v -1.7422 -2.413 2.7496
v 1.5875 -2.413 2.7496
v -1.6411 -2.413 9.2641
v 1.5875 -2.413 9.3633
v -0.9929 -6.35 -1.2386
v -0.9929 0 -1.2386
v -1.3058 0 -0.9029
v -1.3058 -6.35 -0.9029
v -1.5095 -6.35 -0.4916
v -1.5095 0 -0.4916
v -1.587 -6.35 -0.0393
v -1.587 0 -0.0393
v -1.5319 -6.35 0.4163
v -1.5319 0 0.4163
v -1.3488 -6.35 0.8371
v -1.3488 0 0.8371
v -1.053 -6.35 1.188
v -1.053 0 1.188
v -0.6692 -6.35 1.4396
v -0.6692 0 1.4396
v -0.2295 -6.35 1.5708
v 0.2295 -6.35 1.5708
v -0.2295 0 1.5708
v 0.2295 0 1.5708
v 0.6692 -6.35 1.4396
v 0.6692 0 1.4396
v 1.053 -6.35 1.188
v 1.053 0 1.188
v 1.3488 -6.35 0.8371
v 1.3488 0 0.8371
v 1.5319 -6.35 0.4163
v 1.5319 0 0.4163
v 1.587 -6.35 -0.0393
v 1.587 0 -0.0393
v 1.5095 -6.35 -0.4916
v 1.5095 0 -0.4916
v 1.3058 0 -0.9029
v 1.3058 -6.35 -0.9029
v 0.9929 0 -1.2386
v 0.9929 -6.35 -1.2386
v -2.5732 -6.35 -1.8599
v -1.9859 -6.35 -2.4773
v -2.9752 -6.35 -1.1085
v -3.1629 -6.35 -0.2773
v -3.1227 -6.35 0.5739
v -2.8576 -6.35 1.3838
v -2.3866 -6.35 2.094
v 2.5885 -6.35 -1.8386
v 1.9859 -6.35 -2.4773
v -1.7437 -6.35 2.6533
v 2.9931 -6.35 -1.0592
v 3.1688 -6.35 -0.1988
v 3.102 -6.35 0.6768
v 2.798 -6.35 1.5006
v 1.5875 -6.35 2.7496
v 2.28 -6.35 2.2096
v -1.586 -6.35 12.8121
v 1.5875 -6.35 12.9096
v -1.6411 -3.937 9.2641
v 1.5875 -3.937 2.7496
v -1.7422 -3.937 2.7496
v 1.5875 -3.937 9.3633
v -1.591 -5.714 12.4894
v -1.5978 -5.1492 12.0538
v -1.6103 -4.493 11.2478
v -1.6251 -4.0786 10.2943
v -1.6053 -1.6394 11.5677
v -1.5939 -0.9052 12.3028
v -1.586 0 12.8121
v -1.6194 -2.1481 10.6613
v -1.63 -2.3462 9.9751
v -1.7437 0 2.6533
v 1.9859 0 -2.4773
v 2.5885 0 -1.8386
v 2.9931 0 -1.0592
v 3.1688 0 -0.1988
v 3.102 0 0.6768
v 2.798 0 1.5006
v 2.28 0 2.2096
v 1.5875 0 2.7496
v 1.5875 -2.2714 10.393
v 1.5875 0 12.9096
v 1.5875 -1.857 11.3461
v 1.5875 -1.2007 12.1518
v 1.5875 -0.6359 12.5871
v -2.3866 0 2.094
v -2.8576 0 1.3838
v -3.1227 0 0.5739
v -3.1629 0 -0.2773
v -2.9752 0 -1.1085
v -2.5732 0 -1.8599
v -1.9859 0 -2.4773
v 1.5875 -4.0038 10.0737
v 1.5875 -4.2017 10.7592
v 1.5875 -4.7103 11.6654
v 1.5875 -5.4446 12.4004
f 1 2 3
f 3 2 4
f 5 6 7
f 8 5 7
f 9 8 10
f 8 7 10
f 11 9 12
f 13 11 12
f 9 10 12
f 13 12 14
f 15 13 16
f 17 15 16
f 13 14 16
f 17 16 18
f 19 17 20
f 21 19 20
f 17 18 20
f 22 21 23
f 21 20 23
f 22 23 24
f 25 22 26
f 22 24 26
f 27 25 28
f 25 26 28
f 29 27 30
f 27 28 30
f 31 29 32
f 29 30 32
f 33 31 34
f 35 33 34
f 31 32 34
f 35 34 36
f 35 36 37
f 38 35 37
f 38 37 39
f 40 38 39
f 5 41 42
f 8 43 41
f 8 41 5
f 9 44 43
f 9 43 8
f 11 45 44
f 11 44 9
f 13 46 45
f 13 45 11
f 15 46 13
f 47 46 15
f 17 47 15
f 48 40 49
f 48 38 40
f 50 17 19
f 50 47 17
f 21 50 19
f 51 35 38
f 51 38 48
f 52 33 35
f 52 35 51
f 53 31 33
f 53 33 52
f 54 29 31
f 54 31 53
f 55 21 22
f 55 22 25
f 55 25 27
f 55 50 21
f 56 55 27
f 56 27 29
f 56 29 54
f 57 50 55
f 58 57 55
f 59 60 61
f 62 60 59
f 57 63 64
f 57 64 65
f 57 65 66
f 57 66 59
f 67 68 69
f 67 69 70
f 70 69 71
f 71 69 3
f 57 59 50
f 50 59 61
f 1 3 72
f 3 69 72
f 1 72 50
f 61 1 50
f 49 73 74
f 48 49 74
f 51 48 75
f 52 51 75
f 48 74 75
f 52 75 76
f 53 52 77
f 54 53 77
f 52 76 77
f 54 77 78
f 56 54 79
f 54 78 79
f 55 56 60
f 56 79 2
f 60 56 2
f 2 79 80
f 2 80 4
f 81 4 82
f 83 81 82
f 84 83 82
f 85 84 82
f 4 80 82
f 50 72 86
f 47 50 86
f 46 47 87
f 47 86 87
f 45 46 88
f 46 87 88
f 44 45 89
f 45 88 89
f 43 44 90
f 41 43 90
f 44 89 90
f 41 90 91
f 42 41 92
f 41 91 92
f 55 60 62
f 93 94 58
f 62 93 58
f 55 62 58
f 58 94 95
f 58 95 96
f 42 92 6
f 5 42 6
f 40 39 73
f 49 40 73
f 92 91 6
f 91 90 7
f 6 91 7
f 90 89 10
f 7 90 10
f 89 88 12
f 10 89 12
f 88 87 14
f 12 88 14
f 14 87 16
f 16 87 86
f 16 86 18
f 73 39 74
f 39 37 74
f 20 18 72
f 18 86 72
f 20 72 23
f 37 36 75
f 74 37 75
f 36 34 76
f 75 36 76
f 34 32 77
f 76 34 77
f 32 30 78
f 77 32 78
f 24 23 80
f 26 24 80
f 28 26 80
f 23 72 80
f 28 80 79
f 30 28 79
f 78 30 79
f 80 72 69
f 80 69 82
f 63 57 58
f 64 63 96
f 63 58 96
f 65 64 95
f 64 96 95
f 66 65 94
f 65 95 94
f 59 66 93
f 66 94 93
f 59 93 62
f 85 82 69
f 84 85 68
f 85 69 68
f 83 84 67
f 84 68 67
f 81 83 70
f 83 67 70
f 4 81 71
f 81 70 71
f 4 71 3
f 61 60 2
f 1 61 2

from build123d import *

# Parameters (mm, degrees)
F1_DEPTH    = 6.35
F2_W        = 1.524
F2_H        = 10.16
F3_DEPTH    = 25.4
F4_T1_DEPTH = 20.8982128859
F5_T1_DEPTH = 20.8982128859


# Not quite as in the source:
# - a fillet or chamfer that OpenCascade refuses, or shapes differently, is made with other operations: its cross-section is extruded or revolved along the edge and cut away or added


with BuildPart() as f1:
    # F0 (on Front) → F1 (new body)
    with BuildSketch(Plane.XZ):
        with BuildLine():
            Line((0.9929372138, -1.2386411666), (1.9858744275, -2.4772823331))
            ThreePointArc((1.9858744275, -2.4772823331), (3.1658183857, 0.2412860305), (1.5875, 2.749630657))
            Line((1.5875, 2.749630657), (1.5875, 12.909630657))
            Line((1.5875, 12.909630657), (-1.58600151, 12.8120951952))
            Line((-1.58600151, 12.8120951952), (-1.7437092207, 2.653319271))
            ThreePointArc((-1.7437092207, 2.653319271), (-3.1714691788, 0.1496938466), (-1.9858744275, -2.4772823331))
            Line((-1.9858744275, -2.4772823331), (-0.9929372138, -1.2386411666))
            ThreePointArc((-0.9929372138, -1.2386411666), (0, 1.5875), (0.9929372138, -1.2386411666))
        make_face()
    extrude(amount=F1_DEPTH)

    # F2 (on face) → F3 (cut)
    with BuildSketch(Plane.YZ.offset(1.5875)):
        with Locations((-3.175, 7.829630657)):
            Rectangle(F2_W, F2_H)
    extrude(amount=-F3_DEPTH, mode=Mode.SUBTRACT)

    # F4: fillet of radius 3.81 on 1 edges, made by hand

    # F4_s2 → F4_t1 (cut)
    with BuildSketch(Plane(origin=(10.839820428, 0, 0.3331546837), x_dir=(0, 1, 0), z_dir=(-0.9995280346, 0, -0.0307198305))):
        with BuildLine():
            ThreePointArc((-6.35, -12.8547700275), (-4.597502421, -11.4541342134), (-3.937, -9.3101274503))
            Line((-3.937, -9.3101274503), (-3.937, -12.8547700275))
            Line((-3.937, -12.8547700275), (-6.35, -12.8547700275))
        make_face()
    extrude(amount=F4_T1_DEPTH, mode=Mode.SUBTRACT)

    # F5: fillet of radius 3.81 on 1 edges, made by hand

    # F5_s2 → F5_t1 (cut)
    with BuildSketch(Plane(origin=(-10.0485292251, 0, -0.308834874), x_dir=(0, 1, 0), z_dir=(0.9995280346, 0, 0.0307198305))):
        with BuildLine():
            ThreePointArc((0, 12.8547700275), (-1.752497579, 11.4541342134), (-2.413, 9.3101274503))
            Line((-2.413, 9.3101274503), (-2.413, 12.8547700275))
            Line((-2.413, 12.8547700275), (0, 12.8547700275))
        make_face()
    extrude(amount=F5_T1_DEPTH, mode=Mode.SUBTRACT)


solid = f1.part
